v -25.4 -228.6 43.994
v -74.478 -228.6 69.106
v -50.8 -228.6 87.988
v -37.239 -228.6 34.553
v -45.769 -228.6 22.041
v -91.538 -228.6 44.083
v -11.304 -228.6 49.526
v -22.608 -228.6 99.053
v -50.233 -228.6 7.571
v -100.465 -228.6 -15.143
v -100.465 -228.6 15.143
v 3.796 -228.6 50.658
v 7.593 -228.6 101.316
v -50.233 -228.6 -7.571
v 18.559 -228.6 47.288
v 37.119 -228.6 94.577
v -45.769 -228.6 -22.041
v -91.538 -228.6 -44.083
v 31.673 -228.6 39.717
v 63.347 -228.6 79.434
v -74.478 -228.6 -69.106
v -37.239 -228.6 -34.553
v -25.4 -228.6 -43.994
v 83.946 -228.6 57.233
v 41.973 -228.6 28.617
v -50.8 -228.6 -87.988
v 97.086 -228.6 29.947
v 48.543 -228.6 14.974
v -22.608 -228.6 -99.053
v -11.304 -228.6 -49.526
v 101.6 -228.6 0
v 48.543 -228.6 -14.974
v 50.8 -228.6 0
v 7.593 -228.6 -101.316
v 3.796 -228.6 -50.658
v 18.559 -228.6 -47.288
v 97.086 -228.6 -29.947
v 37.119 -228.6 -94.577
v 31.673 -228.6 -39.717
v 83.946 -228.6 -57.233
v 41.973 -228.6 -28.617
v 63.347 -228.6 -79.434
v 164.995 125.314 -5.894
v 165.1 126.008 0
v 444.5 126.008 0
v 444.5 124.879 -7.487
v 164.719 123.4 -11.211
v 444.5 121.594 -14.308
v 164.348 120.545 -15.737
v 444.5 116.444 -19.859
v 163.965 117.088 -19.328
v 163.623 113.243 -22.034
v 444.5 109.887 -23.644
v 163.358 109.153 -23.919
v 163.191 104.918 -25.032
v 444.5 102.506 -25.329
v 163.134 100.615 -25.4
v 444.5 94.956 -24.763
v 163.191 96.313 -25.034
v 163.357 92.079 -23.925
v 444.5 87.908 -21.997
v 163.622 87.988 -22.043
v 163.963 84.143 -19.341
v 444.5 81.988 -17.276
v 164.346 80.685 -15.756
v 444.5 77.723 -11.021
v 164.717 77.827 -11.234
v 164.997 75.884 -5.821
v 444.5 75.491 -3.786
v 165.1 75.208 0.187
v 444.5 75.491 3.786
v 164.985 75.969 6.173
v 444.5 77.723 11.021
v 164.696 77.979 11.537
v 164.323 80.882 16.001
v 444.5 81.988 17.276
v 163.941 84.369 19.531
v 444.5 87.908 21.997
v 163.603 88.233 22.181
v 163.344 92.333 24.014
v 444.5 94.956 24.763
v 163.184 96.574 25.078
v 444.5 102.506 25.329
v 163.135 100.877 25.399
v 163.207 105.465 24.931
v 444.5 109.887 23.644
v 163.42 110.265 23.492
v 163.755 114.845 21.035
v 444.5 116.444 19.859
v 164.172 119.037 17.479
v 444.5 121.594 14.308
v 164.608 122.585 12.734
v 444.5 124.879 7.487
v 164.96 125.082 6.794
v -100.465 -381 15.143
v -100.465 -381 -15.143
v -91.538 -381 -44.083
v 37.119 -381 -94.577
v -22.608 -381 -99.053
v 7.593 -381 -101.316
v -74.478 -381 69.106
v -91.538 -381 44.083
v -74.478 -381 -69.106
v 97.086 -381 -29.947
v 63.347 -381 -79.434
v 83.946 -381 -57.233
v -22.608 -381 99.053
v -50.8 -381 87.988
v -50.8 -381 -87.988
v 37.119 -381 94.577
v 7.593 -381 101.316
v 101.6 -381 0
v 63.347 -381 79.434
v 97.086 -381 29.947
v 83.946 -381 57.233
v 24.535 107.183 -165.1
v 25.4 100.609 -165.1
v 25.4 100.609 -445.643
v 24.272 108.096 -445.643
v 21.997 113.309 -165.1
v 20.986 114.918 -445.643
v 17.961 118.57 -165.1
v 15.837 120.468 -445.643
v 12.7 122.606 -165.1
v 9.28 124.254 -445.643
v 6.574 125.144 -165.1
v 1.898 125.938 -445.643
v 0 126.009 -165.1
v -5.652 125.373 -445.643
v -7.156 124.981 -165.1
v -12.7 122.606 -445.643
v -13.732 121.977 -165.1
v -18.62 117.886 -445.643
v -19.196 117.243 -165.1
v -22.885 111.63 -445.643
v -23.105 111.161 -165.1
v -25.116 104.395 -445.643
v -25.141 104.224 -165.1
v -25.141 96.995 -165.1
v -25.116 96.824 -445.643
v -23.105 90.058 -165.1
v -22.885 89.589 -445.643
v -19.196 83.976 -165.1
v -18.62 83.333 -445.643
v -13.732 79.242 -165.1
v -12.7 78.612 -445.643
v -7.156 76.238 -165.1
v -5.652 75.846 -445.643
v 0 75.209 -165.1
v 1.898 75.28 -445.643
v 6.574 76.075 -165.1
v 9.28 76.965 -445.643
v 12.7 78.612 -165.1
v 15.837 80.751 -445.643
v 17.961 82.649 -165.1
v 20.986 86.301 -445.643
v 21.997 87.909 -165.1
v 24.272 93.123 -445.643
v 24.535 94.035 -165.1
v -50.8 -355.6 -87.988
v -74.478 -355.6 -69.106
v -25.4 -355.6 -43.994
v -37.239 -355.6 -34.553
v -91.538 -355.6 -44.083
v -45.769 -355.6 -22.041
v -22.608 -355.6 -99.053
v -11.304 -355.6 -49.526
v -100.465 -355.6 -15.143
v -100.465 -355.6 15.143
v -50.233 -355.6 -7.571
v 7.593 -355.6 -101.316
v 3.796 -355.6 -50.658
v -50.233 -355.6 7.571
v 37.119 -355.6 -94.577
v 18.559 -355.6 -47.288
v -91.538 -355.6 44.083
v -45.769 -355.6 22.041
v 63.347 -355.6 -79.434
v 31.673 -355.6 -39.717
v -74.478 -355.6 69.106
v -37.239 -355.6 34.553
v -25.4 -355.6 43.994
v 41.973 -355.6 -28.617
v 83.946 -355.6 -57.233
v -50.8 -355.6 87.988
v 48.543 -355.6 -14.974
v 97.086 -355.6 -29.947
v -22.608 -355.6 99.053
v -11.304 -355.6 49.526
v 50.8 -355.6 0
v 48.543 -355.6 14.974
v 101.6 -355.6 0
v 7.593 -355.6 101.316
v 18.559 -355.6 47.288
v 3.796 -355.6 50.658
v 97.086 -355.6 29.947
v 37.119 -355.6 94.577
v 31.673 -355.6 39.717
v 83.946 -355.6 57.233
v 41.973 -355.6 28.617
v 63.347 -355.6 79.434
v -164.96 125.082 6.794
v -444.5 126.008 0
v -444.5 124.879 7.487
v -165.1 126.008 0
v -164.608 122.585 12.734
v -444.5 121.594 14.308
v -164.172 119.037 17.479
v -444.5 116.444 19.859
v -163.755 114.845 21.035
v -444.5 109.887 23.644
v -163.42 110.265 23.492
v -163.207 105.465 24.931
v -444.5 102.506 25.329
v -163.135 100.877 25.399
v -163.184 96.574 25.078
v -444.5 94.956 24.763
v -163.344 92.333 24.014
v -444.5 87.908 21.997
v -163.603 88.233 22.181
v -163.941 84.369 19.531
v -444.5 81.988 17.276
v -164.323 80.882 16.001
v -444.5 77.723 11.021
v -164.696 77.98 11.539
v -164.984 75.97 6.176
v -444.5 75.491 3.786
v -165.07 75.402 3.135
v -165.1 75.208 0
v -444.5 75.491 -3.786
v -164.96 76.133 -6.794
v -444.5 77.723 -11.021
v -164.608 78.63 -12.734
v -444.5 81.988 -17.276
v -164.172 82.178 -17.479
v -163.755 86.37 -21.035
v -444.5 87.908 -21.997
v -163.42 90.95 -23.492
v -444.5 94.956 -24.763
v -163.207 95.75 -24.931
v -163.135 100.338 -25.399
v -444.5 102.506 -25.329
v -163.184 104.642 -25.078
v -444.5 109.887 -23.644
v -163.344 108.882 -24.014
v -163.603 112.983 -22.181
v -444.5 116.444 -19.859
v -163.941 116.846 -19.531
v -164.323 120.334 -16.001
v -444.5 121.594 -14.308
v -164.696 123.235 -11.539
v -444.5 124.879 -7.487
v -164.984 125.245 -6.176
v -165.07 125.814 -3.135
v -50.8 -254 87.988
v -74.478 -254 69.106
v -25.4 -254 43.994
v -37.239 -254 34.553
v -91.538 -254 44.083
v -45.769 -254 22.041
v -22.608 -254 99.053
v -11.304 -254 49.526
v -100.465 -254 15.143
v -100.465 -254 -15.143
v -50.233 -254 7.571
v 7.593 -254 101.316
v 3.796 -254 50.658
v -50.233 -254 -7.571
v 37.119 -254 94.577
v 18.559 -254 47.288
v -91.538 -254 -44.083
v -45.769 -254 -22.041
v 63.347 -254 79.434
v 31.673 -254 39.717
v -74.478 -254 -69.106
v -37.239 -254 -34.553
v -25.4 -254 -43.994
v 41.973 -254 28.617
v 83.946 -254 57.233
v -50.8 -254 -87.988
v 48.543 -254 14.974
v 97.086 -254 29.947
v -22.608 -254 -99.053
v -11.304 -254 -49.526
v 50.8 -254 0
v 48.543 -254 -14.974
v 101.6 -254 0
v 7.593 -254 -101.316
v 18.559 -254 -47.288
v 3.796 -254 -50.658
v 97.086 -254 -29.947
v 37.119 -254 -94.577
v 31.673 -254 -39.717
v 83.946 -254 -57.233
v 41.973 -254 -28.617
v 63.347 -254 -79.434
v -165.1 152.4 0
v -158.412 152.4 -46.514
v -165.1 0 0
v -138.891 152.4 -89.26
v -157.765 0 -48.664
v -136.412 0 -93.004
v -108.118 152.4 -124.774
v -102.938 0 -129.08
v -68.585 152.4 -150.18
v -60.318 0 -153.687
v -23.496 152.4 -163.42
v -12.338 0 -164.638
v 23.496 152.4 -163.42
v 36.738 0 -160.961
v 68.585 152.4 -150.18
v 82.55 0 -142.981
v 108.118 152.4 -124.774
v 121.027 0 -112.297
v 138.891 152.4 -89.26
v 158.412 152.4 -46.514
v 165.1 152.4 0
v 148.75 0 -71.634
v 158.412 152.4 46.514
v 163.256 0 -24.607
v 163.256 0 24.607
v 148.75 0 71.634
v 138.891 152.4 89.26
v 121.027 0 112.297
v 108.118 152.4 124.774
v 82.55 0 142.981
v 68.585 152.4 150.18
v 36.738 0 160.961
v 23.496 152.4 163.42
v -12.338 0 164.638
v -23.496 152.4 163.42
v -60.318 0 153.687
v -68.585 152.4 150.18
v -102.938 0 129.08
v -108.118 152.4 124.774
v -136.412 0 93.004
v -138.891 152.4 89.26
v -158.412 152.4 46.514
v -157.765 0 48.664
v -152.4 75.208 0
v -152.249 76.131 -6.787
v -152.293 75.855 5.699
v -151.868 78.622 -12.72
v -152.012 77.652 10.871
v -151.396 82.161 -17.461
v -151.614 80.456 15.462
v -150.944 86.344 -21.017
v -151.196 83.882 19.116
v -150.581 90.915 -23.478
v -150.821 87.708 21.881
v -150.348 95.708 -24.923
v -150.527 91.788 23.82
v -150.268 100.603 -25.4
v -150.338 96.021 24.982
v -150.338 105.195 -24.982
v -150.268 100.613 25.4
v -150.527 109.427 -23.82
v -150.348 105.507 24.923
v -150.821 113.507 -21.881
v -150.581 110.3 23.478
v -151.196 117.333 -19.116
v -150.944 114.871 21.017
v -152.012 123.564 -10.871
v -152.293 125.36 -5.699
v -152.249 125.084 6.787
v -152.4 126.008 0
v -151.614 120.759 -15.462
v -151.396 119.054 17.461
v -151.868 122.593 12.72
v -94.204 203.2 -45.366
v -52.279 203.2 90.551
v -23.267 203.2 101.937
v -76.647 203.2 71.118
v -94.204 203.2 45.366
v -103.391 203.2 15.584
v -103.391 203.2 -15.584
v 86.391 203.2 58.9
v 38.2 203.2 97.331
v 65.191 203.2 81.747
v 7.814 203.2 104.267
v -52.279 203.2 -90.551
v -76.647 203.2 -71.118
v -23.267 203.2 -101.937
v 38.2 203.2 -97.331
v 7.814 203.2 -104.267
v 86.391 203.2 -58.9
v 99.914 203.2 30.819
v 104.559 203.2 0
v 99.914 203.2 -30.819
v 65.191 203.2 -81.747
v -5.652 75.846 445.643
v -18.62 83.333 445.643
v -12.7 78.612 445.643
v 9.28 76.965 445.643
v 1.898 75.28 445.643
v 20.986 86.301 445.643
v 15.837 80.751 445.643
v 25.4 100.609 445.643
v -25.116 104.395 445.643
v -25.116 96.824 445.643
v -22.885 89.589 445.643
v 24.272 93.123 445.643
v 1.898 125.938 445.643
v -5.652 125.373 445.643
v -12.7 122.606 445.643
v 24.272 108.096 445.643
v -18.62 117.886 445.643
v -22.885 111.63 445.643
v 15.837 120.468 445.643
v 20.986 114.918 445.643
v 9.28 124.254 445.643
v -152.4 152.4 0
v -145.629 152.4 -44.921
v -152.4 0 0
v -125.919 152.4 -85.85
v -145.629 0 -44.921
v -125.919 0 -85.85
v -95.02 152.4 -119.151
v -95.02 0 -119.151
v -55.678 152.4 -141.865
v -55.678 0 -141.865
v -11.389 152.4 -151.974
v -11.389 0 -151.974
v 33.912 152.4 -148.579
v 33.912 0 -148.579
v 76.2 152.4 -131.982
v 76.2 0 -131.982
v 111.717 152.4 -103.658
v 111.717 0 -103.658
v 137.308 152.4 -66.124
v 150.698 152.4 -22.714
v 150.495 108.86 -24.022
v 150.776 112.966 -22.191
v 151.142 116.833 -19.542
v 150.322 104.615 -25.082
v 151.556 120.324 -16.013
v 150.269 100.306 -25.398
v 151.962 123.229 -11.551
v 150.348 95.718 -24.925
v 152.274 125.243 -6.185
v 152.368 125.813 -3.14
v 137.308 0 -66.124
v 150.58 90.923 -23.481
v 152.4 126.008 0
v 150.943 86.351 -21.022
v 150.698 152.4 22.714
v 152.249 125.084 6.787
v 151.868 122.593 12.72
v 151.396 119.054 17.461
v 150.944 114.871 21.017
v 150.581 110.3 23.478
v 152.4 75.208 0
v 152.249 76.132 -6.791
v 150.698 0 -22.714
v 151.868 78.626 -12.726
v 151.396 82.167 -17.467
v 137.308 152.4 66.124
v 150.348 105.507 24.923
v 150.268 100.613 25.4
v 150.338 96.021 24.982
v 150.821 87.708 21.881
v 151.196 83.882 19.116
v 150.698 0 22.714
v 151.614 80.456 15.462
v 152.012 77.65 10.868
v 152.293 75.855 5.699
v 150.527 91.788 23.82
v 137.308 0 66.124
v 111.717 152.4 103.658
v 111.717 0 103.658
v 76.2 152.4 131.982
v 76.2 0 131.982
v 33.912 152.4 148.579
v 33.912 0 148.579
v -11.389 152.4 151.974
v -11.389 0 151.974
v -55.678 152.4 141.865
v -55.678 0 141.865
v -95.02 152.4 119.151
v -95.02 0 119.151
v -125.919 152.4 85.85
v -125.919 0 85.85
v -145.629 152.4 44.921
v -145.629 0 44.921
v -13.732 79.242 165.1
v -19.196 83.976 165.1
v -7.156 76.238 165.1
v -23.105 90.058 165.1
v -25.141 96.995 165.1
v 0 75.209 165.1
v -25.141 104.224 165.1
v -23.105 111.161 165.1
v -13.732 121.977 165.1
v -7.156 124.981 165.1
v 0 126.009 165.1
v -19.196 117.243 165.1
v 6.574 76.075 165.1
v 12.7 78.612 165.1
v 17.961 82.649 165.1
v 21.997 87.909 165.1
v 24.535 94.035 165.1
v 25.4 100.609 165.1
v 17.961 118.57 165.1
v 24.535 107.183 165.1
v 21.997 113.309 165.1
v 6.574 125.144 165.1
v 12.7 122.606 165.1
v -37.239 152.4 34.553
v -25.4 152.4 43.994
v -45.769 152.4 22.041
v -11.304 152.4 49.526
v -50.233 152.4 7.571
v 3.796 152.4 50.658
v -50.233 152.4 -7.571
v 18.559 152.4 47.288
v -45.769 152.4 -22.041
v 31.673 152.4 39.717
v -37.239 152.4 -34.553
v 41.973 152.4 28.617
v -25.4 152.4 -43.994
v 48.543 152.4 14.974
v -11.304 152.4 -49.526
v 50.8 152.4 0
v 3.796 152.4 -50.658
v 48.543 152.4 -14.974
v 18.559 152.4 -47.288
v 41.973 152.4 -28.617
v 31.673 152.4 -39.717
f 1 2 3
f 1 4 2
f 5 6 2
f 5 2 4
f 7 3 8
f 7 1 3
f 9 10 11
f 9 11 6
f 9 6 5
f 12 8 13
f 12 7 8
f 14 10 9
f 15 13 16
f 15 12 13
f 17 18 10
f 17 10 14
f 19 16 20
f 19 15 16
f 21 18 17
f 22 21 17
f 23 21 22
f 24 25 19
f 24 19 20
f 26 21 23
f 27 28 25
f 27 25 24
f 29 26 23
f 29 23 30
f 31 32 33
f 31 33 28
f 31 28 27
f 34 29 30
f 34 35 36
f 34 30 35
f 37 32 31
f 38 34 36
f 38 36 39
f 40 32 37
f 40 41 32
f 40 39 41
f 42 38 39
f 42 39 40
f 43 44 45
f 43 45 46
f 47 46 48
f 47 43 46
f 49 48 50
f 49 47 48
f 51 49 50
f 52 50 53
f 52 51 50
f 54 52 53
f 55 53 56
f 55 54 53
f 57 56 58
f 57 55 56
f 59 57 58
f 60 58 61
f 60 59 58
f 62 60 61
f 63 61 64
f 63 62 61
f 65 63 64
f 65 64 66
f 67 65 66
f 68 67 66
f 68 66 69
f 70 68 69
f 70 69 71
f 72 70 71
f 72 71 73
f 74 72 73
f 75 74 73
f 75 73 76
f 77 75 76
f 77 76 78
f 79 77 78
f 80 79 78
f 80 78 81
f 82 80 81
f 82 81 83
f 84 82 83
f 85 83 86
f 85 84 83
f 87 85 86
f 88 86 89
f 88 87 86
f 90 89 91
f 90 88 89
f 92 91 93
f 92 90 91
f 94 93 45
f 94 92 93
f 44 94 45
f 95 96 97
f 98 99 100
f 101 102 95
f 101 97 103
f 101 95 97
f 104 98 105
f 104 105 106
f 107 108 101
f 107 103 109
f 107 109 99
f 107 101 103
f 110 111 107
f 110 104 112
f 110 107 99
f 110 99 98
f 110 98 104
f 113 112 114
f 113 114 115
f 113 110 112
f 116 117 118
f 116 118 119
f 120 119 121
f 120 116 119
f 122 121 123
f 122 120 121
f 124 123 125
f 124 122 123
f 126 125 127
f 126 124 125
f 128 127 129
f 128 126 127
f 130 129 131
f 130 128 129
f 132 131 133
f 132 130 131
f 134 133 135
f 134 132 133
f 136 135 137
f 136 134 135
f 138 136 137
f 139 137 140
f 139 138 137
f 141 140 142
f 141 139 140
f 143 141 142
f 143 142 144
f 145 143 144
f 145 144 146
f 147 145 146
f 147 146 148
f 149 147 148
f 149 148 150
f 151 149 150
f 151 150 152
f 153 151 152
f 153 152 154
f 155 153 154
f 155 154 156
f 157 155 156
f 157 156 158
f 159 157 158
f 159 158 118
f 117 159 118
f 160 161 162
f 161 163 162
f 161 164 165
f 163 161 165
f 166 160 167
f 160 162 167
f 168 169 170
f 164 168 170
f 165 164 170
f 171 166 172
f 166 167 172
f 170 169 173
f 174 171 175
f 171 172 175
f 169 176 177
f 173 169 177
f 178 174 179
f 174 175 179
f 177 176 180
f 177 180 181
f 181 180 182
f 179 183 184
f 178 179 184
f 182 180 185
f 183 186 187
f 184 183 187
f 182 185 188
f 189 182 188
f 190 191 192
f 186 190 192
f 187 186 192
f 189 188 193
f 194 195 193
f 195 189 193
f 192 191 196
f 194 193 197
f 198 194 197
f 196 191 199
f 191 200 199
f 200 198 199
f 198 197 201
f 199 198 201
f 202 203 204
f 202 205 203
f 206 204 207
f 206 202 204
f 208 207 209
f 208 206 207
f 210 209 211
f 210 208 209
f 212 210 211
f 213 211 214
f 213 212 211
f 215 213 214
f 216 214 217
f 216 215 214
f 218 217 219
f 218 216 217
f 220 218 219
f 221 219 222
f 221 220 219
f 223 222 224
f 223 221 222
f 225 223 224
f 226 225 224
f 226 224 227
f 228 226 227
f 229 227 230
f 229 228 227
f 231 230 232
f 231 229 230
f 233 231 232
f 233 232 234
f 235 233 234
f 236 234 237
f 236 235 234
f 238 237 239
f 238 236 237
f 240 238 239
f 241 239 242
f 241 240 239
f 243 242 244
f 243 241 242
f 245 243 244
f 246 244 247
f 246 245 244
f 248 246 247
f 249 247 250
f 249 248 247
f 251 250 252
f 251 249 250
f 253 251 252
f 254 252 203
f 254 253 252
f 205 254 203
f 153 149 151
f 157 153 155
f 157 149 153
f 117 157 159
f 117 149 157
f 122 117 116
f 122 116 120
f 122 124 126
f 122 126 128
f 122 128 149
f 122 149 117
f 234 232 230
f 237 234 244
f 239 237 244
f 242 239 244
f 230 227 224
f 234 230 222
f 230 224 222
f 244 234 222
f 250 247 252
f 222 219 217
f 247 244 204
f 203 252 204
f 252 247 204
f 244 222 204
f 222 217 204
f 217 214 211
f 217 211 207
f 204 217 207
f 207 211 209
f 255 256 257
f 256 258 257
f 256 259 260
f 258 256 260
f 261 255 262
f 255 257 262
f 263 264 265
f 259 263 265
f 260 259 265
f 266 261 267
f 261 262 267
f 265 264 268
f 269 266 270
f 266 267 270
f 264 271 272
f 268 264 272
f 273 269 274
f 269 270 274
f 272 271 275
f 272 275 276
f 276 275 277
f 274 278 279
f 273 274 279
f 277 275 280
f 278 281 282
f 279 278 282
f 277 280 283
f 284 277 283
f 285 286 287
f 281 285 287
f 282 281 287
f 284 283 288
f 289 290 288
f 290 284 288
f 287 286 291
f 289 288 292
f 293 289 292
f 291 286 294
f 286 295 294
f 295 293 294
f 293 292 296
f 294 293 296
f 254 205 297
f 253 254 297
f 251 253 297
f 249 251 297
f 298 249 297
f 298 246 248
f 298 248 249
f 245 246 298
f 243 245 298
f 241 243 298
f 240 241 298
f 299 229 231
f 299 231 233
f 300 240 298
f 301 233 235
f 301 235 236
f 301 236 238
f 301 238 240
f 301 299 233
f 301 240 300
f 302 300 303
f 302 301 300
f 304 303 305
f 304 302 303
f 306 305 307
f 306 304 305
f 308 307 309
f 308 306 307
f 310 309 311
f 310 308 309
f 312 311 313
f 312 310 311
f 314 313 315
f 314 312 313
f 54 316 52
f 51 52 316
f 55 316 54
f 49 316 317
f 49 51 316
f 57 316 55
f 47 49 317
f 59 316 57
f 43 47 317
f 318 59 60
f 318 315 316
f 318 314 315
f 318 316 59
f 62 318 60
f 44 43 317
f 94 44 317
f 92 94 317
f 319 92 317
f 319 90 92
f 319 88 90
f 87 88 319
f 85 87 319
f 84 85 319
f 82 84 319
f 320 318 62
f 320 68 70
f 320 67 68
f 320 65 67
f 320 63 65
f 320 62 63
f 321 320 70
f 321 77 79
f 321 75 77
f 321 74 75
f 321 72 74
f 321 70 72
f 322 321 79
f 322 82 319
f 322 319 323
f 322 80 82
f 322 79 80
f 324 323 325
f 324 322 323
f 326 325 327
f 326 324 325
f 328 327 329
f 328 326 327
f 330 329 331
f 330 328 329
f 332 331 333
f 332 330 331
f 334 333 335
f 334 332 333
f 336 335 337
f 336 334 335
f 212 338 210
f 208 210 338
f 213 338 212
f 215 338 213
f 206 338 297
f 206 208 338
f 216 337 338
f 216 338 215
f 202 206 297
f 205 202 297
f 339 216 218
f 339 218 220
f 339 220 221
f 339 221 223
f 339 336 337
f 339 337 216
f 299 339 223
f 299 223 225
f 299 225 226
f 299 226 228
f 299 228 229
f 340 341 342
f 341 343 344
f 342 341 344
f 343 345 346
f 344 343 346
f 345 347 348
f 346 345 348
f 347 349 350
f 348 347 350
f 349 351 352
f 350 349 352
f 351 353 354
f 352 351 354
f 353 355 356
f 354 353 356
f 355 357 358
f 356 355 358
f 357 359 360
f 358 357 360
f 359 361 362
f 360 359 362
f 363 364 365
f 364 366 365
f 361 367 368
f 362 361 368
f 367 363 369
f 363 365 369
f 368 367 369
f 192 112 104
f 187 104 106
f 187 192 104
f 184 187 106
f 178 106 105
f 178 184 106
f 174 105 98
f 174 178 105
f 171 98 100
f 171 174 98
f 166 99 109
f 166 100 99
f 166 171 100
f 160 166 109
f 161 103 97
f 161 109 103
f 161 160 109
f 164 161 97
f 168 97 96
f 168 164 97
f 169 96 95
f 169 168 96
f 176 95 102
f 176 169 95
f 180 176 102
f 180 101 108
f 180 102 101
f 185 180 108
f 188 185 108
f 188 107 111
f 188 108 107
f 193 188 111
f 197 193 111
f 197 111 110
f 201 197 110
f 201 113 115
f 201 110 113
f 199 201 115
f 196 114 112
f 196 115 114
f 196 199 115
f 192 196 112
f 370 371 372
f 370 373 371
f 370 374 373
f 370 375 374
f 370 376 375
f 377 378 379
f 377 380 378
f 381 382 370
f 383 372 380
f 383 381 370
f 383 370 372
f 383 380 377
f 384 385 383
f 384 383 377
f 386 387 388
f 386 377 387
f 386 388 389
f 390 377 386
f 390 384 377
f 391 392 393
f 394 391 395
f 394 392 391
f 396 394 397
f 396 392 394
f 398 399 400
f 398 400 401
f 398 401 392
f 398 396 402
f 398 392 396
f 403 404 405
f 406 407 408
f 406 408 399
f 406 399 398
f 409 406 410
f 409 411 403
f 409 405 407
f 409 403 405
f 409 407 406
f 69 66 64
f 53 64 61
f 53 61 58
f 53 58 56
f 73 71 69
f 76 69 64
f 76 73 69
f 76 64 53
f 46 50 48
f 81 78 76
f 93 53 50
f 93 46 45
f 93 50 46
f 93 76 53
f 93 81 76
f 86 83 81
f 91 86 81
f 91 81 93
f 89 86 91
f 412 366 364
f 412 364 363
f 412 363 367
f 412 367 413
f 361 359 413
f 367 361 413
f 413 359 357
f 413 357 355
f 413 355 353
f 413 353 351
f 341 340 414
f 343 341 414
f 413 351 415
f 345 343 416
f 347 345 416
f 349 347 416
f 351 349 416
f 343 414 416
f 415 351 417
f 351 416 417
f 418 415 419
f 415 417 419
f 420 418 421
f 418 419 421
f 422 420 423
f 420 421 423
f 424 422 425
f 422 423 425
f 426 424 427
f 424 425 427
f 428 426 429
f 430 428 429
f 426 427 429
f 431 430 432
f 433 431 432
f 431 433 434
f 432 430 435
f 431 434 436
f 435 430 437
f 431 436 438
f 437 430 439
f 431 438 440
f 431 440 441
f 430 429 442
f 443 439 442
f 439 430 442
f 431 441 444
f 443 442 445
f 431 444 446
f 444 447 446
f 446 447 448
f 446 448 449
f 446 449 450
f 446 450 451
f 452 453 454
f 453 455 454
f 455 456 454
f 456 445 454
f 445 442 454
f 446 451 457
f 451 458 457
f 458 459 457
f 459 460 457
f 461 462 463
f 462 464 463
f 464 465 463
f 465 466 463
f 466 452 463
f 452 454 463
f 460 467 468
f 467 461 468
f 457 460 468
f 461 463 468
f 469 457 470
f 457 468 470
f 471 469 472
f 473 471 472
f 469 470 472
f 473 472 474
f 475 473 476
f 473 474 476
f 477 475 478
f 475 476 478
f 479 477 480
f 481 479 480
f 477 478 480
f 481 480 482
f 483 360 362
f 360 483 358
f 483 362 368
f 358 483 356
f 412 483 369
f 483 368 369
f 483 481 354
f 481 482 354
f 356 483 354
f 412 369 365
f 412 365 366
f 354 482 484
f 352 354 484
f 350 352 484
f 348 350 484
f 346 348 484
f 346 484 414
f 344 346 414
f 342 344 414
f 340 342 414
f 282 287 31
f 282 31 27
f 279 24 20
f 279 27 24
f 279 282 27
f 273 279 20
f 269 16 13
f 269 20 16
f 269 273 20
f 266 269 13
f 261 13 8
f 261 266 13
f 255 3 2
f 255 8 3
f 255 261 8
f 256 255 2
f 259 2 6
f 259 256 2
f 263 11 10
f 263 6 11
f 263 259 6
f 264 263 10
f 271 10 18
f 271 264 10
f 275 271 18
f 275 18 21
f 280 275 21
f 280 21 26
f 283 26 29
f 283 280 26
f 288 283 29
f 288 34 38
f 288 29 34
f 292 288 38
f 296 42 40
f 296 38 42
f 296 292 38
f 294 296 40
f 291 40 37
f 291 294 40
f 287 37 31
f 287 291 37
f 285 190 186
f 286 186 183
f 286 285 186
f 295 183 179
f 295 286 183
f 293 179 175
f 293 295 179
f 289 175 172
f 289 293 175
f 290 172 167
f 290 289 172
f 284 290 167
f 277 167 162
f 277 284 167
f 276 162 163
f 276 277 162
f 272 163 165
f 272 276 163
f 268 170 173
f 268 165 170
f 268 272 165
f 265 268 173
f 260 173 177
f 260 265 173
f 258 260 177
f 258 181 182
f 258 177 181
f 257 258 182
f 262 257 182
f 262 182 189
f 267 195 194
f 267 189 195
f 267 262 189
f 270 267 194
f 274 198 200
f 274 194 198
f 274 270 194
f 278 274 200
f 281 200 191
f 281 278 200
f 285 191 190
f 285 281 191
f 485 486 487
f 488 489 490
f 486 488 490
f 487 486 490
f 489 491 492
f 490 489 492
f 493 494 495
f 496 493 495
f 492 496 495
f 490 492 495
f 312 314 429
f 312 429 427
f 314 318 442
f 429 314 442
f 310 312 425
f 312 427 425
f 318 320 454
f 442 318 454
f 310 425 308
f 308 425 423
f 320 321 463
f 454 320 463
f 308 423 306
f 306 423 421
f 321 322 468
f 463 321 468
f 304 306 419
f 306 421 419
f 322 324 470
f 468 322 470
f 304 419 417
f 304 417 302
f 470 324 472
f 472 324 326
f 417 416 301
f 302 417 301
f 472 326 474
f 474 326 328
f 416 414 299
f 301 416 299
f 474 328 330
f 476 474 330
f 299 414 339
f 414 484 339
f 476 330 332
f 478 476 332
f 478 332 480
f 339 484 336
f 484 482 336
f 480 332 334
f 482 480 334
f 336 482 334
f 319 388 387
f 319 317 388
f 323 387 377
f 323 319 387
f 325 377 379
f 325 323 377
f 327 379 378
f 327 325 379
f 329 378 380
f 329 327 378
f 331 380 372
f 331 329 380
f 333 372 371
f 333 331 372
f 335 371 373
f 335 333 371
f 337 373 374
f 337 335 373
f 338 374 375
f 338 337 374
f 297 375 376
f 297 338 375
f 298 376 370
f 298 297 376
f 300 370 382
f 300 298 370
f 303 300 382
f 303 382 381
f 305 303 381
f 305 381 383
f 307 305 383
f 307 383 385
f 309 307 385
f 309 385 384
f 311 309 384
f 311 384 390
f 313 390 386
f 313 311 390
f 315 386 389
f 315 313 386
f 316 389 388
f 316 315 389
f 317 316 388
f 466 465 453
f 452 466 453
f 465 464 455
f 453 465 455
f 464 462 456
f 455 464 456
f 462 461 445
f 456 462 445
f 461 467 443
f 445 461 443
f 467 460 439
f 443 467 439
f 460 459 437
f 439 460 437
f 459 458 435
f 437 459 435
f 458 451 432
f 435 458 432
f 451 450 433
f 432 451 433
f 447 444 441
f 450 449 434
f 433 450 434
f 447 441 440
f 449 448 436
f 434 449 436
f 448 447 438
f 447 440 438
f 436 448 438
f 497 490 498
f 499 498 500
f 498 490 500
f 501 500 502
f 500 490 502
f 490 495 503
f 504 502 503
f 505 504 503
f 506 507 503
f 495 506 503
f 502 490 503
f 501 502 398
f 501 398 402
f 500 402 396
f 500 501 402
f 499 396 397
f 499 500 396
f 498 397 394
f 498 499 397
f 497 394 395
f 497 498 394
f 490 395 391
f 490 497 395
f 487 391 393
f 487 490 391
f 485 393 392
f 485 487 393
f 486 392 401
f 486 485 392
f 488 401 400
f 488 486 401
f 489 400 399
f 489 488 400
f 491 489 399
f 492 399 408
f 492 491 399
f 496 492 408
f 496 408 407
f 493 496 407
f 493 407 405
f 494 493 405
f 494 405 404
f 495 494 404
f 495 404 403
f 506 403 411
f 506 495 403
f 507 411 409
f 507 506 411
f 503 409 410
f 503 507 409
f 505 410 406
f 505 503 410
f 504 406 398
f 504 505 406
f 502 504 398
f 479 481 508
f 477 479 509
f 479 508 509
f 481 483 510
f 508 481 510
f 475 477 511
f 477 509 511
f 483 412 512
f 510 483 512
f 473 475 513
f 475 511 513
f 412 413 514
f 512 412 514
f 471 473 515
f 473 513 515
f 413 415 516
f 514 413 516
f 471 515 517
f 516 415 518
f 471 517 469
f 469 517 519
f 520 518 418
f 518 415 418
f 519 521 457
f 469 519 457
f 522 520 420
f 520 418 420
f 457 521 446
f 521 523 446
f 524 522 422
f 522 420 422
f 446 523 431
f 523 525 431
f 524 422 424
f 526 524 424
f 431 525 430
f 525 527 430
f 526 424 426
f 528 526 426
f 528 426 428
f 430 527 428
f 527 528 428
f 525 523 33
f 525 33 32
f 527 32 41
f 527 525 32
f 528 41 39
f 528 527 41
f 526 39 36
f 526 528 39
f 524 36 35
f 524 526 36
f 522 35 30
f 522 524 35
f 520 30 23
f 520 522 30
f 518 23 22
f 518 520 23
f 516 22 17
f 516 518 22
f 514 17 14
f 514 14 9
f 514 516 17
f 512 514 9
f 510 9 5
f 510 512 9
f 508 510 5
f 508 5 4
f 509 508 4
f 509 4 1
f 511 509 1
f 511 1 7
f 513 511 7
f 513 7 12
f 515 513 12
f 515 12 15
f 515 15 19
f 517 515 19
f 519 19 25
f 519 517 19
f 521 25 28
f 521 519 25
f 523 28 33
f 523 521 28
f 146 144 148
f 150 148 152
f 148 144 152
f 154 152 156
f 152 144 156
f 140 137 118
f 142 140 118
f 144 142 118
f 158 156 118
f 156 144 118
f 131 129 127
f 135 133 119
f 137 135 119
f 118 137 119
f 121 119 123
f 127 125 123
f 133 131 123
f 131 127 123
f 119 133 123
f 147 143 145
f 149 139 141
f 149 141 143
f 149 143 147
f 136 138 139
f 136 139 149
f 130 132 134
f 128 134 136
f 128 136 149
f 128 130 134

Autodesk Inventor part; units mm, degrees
sketch "Sketch1" plane through (0, 0, 0) normal (0, 1, 0) x (-1, 0, 0)
  circle A0 centre (0, 0) radius 152.4
  circle A1 centre (0, 0) radius 165.1
  dimension "d0" = 304.8
  dimension "d1" = 330.2
extrude "Extrusion1" add sketch "Sketch1" along normal blind 152.4
sketch "Sketch2" plane through (0, 0, 0) normal (1, 0, 0) x (0, 1, 0)
  circle A0 centre (100.6077, 0) radius 25.4
  point P0 (0, 0)
  dimension "d4" = 50.8
extrude "Extrusion2" add sketch "Sketch2" along normal mid plane 889
sketch "Sketch4" plane through (0, 152.4, 0) normal (0, 1, 0) x (1, 0, 0)
  circle A0 centre (0, 0) radius 152.4
extrude "Extrusion4" cut sketch "Sketch4" against normal through all
sketch "Sketch5" plane through (0, 152.4, 0) normal (0, 1, 0) x (1, 0, 0)
  circle A0 centre (0, 0) radius 165.1
extrude "Extrusion5" add sketch "Sketch5" along normal blind 50.8 draft -50
sketch "Sketch6" plane through (0, 152.4, 0) normal (0, -1, 0) x (1, 0, 0)
  circle A0 centre (0, 0) radius 104.5589 projected
  circle A1 centre (0, 0) radius 50.8
  dimension "d15" = 101.6
extrude "Extrusion6" add sketch "Sketch6" along normal blind 508 contours A1
sketch "Sketch7" plane through (0, -355.6, 0) normal (0, -1, 0) x (1, 0, 0)
  circle A0 centre (0, 0) radius 104.5589 projected
  circle A1 centre (0, 0) radius 101.6
  dimension "d18" = 203.2
extrude "Extrusion7" add sketch "Sketch7" along normal blind 25.4 contours A1
ref_plane "Work Plane1" through (0, -254, 0) normal (0, 1, 0) x (1, 0, 0)
sketch "Sketch8" plane through (0, -254, 0) normal (0, 1, 0) x (1, 0, 0)
  circle A0 centre (0, 0) radius 101.6
  dimension "d22" = 203.2
extrude "Extrusion8" add sketch "Sketch8" along normal blind 25.4
ref_plane "Work Plane2" through (75.376, -18.8821, -44.9646) normal (1, 0, 0) x (0, 1, 0)
sketch "Sketch9" plane through (75.376, -18.8821, -44.9646) normal (1, 0, 0) x (0, 1, 0)
  circle A0 centre (-604.603, 44.9646) radius 12.7
  point P0 (18.8821, 44.9646)
  dimension "d25" = 25.4
extrude "Extrusion9" cut sketch "Sketch9" against normal through all
ref_plane "Work Plane4" through (0, 0, 0) normal (0, 1, 0) x (1, 0, 0)
ref_plane "Work Plane5" through (0, 25.4, 165.1) normal (0, 0, 1) x (1, 0, 0)
sketch "Sketch11" plane through (0, 25.4, 165.1) normal (0, 0, 1) x (1, 0, 0)
  circle A0 centre (0, 75.2094) radius 25.4
  line L0 (165.1, -25.4) -> (-165.1, -25.4) projected
  point P0 (0, -25.4)
  dimension "d31" = 50.8
  dimension "d32" = 100.6094
extrude "Extrusion11" add sketch "Sketch11" along normal blind 280.543
ref_plane "Work Plane6" through (0, 25.4, -165.1) normal (0, 0, 1) x (1, 0, 0)
sketch "Sketch12" plane through (0, 25.4, -165.1) normal (0, 0, 1) x (1, 0, 0)
  circle A0 centre (0, 75.2094) radius 25.4
  line L0 (165.1, -25.4) -> (-165.1, -25.4) projected
  point P0 (0, -25.4)
  dimension "d36" = 50.8
  dimension "d37" = 100.6094
extrude "Extrusion12" add sketch "Sketch12" against normal blind 280.543
properties part number "capistan upper"
